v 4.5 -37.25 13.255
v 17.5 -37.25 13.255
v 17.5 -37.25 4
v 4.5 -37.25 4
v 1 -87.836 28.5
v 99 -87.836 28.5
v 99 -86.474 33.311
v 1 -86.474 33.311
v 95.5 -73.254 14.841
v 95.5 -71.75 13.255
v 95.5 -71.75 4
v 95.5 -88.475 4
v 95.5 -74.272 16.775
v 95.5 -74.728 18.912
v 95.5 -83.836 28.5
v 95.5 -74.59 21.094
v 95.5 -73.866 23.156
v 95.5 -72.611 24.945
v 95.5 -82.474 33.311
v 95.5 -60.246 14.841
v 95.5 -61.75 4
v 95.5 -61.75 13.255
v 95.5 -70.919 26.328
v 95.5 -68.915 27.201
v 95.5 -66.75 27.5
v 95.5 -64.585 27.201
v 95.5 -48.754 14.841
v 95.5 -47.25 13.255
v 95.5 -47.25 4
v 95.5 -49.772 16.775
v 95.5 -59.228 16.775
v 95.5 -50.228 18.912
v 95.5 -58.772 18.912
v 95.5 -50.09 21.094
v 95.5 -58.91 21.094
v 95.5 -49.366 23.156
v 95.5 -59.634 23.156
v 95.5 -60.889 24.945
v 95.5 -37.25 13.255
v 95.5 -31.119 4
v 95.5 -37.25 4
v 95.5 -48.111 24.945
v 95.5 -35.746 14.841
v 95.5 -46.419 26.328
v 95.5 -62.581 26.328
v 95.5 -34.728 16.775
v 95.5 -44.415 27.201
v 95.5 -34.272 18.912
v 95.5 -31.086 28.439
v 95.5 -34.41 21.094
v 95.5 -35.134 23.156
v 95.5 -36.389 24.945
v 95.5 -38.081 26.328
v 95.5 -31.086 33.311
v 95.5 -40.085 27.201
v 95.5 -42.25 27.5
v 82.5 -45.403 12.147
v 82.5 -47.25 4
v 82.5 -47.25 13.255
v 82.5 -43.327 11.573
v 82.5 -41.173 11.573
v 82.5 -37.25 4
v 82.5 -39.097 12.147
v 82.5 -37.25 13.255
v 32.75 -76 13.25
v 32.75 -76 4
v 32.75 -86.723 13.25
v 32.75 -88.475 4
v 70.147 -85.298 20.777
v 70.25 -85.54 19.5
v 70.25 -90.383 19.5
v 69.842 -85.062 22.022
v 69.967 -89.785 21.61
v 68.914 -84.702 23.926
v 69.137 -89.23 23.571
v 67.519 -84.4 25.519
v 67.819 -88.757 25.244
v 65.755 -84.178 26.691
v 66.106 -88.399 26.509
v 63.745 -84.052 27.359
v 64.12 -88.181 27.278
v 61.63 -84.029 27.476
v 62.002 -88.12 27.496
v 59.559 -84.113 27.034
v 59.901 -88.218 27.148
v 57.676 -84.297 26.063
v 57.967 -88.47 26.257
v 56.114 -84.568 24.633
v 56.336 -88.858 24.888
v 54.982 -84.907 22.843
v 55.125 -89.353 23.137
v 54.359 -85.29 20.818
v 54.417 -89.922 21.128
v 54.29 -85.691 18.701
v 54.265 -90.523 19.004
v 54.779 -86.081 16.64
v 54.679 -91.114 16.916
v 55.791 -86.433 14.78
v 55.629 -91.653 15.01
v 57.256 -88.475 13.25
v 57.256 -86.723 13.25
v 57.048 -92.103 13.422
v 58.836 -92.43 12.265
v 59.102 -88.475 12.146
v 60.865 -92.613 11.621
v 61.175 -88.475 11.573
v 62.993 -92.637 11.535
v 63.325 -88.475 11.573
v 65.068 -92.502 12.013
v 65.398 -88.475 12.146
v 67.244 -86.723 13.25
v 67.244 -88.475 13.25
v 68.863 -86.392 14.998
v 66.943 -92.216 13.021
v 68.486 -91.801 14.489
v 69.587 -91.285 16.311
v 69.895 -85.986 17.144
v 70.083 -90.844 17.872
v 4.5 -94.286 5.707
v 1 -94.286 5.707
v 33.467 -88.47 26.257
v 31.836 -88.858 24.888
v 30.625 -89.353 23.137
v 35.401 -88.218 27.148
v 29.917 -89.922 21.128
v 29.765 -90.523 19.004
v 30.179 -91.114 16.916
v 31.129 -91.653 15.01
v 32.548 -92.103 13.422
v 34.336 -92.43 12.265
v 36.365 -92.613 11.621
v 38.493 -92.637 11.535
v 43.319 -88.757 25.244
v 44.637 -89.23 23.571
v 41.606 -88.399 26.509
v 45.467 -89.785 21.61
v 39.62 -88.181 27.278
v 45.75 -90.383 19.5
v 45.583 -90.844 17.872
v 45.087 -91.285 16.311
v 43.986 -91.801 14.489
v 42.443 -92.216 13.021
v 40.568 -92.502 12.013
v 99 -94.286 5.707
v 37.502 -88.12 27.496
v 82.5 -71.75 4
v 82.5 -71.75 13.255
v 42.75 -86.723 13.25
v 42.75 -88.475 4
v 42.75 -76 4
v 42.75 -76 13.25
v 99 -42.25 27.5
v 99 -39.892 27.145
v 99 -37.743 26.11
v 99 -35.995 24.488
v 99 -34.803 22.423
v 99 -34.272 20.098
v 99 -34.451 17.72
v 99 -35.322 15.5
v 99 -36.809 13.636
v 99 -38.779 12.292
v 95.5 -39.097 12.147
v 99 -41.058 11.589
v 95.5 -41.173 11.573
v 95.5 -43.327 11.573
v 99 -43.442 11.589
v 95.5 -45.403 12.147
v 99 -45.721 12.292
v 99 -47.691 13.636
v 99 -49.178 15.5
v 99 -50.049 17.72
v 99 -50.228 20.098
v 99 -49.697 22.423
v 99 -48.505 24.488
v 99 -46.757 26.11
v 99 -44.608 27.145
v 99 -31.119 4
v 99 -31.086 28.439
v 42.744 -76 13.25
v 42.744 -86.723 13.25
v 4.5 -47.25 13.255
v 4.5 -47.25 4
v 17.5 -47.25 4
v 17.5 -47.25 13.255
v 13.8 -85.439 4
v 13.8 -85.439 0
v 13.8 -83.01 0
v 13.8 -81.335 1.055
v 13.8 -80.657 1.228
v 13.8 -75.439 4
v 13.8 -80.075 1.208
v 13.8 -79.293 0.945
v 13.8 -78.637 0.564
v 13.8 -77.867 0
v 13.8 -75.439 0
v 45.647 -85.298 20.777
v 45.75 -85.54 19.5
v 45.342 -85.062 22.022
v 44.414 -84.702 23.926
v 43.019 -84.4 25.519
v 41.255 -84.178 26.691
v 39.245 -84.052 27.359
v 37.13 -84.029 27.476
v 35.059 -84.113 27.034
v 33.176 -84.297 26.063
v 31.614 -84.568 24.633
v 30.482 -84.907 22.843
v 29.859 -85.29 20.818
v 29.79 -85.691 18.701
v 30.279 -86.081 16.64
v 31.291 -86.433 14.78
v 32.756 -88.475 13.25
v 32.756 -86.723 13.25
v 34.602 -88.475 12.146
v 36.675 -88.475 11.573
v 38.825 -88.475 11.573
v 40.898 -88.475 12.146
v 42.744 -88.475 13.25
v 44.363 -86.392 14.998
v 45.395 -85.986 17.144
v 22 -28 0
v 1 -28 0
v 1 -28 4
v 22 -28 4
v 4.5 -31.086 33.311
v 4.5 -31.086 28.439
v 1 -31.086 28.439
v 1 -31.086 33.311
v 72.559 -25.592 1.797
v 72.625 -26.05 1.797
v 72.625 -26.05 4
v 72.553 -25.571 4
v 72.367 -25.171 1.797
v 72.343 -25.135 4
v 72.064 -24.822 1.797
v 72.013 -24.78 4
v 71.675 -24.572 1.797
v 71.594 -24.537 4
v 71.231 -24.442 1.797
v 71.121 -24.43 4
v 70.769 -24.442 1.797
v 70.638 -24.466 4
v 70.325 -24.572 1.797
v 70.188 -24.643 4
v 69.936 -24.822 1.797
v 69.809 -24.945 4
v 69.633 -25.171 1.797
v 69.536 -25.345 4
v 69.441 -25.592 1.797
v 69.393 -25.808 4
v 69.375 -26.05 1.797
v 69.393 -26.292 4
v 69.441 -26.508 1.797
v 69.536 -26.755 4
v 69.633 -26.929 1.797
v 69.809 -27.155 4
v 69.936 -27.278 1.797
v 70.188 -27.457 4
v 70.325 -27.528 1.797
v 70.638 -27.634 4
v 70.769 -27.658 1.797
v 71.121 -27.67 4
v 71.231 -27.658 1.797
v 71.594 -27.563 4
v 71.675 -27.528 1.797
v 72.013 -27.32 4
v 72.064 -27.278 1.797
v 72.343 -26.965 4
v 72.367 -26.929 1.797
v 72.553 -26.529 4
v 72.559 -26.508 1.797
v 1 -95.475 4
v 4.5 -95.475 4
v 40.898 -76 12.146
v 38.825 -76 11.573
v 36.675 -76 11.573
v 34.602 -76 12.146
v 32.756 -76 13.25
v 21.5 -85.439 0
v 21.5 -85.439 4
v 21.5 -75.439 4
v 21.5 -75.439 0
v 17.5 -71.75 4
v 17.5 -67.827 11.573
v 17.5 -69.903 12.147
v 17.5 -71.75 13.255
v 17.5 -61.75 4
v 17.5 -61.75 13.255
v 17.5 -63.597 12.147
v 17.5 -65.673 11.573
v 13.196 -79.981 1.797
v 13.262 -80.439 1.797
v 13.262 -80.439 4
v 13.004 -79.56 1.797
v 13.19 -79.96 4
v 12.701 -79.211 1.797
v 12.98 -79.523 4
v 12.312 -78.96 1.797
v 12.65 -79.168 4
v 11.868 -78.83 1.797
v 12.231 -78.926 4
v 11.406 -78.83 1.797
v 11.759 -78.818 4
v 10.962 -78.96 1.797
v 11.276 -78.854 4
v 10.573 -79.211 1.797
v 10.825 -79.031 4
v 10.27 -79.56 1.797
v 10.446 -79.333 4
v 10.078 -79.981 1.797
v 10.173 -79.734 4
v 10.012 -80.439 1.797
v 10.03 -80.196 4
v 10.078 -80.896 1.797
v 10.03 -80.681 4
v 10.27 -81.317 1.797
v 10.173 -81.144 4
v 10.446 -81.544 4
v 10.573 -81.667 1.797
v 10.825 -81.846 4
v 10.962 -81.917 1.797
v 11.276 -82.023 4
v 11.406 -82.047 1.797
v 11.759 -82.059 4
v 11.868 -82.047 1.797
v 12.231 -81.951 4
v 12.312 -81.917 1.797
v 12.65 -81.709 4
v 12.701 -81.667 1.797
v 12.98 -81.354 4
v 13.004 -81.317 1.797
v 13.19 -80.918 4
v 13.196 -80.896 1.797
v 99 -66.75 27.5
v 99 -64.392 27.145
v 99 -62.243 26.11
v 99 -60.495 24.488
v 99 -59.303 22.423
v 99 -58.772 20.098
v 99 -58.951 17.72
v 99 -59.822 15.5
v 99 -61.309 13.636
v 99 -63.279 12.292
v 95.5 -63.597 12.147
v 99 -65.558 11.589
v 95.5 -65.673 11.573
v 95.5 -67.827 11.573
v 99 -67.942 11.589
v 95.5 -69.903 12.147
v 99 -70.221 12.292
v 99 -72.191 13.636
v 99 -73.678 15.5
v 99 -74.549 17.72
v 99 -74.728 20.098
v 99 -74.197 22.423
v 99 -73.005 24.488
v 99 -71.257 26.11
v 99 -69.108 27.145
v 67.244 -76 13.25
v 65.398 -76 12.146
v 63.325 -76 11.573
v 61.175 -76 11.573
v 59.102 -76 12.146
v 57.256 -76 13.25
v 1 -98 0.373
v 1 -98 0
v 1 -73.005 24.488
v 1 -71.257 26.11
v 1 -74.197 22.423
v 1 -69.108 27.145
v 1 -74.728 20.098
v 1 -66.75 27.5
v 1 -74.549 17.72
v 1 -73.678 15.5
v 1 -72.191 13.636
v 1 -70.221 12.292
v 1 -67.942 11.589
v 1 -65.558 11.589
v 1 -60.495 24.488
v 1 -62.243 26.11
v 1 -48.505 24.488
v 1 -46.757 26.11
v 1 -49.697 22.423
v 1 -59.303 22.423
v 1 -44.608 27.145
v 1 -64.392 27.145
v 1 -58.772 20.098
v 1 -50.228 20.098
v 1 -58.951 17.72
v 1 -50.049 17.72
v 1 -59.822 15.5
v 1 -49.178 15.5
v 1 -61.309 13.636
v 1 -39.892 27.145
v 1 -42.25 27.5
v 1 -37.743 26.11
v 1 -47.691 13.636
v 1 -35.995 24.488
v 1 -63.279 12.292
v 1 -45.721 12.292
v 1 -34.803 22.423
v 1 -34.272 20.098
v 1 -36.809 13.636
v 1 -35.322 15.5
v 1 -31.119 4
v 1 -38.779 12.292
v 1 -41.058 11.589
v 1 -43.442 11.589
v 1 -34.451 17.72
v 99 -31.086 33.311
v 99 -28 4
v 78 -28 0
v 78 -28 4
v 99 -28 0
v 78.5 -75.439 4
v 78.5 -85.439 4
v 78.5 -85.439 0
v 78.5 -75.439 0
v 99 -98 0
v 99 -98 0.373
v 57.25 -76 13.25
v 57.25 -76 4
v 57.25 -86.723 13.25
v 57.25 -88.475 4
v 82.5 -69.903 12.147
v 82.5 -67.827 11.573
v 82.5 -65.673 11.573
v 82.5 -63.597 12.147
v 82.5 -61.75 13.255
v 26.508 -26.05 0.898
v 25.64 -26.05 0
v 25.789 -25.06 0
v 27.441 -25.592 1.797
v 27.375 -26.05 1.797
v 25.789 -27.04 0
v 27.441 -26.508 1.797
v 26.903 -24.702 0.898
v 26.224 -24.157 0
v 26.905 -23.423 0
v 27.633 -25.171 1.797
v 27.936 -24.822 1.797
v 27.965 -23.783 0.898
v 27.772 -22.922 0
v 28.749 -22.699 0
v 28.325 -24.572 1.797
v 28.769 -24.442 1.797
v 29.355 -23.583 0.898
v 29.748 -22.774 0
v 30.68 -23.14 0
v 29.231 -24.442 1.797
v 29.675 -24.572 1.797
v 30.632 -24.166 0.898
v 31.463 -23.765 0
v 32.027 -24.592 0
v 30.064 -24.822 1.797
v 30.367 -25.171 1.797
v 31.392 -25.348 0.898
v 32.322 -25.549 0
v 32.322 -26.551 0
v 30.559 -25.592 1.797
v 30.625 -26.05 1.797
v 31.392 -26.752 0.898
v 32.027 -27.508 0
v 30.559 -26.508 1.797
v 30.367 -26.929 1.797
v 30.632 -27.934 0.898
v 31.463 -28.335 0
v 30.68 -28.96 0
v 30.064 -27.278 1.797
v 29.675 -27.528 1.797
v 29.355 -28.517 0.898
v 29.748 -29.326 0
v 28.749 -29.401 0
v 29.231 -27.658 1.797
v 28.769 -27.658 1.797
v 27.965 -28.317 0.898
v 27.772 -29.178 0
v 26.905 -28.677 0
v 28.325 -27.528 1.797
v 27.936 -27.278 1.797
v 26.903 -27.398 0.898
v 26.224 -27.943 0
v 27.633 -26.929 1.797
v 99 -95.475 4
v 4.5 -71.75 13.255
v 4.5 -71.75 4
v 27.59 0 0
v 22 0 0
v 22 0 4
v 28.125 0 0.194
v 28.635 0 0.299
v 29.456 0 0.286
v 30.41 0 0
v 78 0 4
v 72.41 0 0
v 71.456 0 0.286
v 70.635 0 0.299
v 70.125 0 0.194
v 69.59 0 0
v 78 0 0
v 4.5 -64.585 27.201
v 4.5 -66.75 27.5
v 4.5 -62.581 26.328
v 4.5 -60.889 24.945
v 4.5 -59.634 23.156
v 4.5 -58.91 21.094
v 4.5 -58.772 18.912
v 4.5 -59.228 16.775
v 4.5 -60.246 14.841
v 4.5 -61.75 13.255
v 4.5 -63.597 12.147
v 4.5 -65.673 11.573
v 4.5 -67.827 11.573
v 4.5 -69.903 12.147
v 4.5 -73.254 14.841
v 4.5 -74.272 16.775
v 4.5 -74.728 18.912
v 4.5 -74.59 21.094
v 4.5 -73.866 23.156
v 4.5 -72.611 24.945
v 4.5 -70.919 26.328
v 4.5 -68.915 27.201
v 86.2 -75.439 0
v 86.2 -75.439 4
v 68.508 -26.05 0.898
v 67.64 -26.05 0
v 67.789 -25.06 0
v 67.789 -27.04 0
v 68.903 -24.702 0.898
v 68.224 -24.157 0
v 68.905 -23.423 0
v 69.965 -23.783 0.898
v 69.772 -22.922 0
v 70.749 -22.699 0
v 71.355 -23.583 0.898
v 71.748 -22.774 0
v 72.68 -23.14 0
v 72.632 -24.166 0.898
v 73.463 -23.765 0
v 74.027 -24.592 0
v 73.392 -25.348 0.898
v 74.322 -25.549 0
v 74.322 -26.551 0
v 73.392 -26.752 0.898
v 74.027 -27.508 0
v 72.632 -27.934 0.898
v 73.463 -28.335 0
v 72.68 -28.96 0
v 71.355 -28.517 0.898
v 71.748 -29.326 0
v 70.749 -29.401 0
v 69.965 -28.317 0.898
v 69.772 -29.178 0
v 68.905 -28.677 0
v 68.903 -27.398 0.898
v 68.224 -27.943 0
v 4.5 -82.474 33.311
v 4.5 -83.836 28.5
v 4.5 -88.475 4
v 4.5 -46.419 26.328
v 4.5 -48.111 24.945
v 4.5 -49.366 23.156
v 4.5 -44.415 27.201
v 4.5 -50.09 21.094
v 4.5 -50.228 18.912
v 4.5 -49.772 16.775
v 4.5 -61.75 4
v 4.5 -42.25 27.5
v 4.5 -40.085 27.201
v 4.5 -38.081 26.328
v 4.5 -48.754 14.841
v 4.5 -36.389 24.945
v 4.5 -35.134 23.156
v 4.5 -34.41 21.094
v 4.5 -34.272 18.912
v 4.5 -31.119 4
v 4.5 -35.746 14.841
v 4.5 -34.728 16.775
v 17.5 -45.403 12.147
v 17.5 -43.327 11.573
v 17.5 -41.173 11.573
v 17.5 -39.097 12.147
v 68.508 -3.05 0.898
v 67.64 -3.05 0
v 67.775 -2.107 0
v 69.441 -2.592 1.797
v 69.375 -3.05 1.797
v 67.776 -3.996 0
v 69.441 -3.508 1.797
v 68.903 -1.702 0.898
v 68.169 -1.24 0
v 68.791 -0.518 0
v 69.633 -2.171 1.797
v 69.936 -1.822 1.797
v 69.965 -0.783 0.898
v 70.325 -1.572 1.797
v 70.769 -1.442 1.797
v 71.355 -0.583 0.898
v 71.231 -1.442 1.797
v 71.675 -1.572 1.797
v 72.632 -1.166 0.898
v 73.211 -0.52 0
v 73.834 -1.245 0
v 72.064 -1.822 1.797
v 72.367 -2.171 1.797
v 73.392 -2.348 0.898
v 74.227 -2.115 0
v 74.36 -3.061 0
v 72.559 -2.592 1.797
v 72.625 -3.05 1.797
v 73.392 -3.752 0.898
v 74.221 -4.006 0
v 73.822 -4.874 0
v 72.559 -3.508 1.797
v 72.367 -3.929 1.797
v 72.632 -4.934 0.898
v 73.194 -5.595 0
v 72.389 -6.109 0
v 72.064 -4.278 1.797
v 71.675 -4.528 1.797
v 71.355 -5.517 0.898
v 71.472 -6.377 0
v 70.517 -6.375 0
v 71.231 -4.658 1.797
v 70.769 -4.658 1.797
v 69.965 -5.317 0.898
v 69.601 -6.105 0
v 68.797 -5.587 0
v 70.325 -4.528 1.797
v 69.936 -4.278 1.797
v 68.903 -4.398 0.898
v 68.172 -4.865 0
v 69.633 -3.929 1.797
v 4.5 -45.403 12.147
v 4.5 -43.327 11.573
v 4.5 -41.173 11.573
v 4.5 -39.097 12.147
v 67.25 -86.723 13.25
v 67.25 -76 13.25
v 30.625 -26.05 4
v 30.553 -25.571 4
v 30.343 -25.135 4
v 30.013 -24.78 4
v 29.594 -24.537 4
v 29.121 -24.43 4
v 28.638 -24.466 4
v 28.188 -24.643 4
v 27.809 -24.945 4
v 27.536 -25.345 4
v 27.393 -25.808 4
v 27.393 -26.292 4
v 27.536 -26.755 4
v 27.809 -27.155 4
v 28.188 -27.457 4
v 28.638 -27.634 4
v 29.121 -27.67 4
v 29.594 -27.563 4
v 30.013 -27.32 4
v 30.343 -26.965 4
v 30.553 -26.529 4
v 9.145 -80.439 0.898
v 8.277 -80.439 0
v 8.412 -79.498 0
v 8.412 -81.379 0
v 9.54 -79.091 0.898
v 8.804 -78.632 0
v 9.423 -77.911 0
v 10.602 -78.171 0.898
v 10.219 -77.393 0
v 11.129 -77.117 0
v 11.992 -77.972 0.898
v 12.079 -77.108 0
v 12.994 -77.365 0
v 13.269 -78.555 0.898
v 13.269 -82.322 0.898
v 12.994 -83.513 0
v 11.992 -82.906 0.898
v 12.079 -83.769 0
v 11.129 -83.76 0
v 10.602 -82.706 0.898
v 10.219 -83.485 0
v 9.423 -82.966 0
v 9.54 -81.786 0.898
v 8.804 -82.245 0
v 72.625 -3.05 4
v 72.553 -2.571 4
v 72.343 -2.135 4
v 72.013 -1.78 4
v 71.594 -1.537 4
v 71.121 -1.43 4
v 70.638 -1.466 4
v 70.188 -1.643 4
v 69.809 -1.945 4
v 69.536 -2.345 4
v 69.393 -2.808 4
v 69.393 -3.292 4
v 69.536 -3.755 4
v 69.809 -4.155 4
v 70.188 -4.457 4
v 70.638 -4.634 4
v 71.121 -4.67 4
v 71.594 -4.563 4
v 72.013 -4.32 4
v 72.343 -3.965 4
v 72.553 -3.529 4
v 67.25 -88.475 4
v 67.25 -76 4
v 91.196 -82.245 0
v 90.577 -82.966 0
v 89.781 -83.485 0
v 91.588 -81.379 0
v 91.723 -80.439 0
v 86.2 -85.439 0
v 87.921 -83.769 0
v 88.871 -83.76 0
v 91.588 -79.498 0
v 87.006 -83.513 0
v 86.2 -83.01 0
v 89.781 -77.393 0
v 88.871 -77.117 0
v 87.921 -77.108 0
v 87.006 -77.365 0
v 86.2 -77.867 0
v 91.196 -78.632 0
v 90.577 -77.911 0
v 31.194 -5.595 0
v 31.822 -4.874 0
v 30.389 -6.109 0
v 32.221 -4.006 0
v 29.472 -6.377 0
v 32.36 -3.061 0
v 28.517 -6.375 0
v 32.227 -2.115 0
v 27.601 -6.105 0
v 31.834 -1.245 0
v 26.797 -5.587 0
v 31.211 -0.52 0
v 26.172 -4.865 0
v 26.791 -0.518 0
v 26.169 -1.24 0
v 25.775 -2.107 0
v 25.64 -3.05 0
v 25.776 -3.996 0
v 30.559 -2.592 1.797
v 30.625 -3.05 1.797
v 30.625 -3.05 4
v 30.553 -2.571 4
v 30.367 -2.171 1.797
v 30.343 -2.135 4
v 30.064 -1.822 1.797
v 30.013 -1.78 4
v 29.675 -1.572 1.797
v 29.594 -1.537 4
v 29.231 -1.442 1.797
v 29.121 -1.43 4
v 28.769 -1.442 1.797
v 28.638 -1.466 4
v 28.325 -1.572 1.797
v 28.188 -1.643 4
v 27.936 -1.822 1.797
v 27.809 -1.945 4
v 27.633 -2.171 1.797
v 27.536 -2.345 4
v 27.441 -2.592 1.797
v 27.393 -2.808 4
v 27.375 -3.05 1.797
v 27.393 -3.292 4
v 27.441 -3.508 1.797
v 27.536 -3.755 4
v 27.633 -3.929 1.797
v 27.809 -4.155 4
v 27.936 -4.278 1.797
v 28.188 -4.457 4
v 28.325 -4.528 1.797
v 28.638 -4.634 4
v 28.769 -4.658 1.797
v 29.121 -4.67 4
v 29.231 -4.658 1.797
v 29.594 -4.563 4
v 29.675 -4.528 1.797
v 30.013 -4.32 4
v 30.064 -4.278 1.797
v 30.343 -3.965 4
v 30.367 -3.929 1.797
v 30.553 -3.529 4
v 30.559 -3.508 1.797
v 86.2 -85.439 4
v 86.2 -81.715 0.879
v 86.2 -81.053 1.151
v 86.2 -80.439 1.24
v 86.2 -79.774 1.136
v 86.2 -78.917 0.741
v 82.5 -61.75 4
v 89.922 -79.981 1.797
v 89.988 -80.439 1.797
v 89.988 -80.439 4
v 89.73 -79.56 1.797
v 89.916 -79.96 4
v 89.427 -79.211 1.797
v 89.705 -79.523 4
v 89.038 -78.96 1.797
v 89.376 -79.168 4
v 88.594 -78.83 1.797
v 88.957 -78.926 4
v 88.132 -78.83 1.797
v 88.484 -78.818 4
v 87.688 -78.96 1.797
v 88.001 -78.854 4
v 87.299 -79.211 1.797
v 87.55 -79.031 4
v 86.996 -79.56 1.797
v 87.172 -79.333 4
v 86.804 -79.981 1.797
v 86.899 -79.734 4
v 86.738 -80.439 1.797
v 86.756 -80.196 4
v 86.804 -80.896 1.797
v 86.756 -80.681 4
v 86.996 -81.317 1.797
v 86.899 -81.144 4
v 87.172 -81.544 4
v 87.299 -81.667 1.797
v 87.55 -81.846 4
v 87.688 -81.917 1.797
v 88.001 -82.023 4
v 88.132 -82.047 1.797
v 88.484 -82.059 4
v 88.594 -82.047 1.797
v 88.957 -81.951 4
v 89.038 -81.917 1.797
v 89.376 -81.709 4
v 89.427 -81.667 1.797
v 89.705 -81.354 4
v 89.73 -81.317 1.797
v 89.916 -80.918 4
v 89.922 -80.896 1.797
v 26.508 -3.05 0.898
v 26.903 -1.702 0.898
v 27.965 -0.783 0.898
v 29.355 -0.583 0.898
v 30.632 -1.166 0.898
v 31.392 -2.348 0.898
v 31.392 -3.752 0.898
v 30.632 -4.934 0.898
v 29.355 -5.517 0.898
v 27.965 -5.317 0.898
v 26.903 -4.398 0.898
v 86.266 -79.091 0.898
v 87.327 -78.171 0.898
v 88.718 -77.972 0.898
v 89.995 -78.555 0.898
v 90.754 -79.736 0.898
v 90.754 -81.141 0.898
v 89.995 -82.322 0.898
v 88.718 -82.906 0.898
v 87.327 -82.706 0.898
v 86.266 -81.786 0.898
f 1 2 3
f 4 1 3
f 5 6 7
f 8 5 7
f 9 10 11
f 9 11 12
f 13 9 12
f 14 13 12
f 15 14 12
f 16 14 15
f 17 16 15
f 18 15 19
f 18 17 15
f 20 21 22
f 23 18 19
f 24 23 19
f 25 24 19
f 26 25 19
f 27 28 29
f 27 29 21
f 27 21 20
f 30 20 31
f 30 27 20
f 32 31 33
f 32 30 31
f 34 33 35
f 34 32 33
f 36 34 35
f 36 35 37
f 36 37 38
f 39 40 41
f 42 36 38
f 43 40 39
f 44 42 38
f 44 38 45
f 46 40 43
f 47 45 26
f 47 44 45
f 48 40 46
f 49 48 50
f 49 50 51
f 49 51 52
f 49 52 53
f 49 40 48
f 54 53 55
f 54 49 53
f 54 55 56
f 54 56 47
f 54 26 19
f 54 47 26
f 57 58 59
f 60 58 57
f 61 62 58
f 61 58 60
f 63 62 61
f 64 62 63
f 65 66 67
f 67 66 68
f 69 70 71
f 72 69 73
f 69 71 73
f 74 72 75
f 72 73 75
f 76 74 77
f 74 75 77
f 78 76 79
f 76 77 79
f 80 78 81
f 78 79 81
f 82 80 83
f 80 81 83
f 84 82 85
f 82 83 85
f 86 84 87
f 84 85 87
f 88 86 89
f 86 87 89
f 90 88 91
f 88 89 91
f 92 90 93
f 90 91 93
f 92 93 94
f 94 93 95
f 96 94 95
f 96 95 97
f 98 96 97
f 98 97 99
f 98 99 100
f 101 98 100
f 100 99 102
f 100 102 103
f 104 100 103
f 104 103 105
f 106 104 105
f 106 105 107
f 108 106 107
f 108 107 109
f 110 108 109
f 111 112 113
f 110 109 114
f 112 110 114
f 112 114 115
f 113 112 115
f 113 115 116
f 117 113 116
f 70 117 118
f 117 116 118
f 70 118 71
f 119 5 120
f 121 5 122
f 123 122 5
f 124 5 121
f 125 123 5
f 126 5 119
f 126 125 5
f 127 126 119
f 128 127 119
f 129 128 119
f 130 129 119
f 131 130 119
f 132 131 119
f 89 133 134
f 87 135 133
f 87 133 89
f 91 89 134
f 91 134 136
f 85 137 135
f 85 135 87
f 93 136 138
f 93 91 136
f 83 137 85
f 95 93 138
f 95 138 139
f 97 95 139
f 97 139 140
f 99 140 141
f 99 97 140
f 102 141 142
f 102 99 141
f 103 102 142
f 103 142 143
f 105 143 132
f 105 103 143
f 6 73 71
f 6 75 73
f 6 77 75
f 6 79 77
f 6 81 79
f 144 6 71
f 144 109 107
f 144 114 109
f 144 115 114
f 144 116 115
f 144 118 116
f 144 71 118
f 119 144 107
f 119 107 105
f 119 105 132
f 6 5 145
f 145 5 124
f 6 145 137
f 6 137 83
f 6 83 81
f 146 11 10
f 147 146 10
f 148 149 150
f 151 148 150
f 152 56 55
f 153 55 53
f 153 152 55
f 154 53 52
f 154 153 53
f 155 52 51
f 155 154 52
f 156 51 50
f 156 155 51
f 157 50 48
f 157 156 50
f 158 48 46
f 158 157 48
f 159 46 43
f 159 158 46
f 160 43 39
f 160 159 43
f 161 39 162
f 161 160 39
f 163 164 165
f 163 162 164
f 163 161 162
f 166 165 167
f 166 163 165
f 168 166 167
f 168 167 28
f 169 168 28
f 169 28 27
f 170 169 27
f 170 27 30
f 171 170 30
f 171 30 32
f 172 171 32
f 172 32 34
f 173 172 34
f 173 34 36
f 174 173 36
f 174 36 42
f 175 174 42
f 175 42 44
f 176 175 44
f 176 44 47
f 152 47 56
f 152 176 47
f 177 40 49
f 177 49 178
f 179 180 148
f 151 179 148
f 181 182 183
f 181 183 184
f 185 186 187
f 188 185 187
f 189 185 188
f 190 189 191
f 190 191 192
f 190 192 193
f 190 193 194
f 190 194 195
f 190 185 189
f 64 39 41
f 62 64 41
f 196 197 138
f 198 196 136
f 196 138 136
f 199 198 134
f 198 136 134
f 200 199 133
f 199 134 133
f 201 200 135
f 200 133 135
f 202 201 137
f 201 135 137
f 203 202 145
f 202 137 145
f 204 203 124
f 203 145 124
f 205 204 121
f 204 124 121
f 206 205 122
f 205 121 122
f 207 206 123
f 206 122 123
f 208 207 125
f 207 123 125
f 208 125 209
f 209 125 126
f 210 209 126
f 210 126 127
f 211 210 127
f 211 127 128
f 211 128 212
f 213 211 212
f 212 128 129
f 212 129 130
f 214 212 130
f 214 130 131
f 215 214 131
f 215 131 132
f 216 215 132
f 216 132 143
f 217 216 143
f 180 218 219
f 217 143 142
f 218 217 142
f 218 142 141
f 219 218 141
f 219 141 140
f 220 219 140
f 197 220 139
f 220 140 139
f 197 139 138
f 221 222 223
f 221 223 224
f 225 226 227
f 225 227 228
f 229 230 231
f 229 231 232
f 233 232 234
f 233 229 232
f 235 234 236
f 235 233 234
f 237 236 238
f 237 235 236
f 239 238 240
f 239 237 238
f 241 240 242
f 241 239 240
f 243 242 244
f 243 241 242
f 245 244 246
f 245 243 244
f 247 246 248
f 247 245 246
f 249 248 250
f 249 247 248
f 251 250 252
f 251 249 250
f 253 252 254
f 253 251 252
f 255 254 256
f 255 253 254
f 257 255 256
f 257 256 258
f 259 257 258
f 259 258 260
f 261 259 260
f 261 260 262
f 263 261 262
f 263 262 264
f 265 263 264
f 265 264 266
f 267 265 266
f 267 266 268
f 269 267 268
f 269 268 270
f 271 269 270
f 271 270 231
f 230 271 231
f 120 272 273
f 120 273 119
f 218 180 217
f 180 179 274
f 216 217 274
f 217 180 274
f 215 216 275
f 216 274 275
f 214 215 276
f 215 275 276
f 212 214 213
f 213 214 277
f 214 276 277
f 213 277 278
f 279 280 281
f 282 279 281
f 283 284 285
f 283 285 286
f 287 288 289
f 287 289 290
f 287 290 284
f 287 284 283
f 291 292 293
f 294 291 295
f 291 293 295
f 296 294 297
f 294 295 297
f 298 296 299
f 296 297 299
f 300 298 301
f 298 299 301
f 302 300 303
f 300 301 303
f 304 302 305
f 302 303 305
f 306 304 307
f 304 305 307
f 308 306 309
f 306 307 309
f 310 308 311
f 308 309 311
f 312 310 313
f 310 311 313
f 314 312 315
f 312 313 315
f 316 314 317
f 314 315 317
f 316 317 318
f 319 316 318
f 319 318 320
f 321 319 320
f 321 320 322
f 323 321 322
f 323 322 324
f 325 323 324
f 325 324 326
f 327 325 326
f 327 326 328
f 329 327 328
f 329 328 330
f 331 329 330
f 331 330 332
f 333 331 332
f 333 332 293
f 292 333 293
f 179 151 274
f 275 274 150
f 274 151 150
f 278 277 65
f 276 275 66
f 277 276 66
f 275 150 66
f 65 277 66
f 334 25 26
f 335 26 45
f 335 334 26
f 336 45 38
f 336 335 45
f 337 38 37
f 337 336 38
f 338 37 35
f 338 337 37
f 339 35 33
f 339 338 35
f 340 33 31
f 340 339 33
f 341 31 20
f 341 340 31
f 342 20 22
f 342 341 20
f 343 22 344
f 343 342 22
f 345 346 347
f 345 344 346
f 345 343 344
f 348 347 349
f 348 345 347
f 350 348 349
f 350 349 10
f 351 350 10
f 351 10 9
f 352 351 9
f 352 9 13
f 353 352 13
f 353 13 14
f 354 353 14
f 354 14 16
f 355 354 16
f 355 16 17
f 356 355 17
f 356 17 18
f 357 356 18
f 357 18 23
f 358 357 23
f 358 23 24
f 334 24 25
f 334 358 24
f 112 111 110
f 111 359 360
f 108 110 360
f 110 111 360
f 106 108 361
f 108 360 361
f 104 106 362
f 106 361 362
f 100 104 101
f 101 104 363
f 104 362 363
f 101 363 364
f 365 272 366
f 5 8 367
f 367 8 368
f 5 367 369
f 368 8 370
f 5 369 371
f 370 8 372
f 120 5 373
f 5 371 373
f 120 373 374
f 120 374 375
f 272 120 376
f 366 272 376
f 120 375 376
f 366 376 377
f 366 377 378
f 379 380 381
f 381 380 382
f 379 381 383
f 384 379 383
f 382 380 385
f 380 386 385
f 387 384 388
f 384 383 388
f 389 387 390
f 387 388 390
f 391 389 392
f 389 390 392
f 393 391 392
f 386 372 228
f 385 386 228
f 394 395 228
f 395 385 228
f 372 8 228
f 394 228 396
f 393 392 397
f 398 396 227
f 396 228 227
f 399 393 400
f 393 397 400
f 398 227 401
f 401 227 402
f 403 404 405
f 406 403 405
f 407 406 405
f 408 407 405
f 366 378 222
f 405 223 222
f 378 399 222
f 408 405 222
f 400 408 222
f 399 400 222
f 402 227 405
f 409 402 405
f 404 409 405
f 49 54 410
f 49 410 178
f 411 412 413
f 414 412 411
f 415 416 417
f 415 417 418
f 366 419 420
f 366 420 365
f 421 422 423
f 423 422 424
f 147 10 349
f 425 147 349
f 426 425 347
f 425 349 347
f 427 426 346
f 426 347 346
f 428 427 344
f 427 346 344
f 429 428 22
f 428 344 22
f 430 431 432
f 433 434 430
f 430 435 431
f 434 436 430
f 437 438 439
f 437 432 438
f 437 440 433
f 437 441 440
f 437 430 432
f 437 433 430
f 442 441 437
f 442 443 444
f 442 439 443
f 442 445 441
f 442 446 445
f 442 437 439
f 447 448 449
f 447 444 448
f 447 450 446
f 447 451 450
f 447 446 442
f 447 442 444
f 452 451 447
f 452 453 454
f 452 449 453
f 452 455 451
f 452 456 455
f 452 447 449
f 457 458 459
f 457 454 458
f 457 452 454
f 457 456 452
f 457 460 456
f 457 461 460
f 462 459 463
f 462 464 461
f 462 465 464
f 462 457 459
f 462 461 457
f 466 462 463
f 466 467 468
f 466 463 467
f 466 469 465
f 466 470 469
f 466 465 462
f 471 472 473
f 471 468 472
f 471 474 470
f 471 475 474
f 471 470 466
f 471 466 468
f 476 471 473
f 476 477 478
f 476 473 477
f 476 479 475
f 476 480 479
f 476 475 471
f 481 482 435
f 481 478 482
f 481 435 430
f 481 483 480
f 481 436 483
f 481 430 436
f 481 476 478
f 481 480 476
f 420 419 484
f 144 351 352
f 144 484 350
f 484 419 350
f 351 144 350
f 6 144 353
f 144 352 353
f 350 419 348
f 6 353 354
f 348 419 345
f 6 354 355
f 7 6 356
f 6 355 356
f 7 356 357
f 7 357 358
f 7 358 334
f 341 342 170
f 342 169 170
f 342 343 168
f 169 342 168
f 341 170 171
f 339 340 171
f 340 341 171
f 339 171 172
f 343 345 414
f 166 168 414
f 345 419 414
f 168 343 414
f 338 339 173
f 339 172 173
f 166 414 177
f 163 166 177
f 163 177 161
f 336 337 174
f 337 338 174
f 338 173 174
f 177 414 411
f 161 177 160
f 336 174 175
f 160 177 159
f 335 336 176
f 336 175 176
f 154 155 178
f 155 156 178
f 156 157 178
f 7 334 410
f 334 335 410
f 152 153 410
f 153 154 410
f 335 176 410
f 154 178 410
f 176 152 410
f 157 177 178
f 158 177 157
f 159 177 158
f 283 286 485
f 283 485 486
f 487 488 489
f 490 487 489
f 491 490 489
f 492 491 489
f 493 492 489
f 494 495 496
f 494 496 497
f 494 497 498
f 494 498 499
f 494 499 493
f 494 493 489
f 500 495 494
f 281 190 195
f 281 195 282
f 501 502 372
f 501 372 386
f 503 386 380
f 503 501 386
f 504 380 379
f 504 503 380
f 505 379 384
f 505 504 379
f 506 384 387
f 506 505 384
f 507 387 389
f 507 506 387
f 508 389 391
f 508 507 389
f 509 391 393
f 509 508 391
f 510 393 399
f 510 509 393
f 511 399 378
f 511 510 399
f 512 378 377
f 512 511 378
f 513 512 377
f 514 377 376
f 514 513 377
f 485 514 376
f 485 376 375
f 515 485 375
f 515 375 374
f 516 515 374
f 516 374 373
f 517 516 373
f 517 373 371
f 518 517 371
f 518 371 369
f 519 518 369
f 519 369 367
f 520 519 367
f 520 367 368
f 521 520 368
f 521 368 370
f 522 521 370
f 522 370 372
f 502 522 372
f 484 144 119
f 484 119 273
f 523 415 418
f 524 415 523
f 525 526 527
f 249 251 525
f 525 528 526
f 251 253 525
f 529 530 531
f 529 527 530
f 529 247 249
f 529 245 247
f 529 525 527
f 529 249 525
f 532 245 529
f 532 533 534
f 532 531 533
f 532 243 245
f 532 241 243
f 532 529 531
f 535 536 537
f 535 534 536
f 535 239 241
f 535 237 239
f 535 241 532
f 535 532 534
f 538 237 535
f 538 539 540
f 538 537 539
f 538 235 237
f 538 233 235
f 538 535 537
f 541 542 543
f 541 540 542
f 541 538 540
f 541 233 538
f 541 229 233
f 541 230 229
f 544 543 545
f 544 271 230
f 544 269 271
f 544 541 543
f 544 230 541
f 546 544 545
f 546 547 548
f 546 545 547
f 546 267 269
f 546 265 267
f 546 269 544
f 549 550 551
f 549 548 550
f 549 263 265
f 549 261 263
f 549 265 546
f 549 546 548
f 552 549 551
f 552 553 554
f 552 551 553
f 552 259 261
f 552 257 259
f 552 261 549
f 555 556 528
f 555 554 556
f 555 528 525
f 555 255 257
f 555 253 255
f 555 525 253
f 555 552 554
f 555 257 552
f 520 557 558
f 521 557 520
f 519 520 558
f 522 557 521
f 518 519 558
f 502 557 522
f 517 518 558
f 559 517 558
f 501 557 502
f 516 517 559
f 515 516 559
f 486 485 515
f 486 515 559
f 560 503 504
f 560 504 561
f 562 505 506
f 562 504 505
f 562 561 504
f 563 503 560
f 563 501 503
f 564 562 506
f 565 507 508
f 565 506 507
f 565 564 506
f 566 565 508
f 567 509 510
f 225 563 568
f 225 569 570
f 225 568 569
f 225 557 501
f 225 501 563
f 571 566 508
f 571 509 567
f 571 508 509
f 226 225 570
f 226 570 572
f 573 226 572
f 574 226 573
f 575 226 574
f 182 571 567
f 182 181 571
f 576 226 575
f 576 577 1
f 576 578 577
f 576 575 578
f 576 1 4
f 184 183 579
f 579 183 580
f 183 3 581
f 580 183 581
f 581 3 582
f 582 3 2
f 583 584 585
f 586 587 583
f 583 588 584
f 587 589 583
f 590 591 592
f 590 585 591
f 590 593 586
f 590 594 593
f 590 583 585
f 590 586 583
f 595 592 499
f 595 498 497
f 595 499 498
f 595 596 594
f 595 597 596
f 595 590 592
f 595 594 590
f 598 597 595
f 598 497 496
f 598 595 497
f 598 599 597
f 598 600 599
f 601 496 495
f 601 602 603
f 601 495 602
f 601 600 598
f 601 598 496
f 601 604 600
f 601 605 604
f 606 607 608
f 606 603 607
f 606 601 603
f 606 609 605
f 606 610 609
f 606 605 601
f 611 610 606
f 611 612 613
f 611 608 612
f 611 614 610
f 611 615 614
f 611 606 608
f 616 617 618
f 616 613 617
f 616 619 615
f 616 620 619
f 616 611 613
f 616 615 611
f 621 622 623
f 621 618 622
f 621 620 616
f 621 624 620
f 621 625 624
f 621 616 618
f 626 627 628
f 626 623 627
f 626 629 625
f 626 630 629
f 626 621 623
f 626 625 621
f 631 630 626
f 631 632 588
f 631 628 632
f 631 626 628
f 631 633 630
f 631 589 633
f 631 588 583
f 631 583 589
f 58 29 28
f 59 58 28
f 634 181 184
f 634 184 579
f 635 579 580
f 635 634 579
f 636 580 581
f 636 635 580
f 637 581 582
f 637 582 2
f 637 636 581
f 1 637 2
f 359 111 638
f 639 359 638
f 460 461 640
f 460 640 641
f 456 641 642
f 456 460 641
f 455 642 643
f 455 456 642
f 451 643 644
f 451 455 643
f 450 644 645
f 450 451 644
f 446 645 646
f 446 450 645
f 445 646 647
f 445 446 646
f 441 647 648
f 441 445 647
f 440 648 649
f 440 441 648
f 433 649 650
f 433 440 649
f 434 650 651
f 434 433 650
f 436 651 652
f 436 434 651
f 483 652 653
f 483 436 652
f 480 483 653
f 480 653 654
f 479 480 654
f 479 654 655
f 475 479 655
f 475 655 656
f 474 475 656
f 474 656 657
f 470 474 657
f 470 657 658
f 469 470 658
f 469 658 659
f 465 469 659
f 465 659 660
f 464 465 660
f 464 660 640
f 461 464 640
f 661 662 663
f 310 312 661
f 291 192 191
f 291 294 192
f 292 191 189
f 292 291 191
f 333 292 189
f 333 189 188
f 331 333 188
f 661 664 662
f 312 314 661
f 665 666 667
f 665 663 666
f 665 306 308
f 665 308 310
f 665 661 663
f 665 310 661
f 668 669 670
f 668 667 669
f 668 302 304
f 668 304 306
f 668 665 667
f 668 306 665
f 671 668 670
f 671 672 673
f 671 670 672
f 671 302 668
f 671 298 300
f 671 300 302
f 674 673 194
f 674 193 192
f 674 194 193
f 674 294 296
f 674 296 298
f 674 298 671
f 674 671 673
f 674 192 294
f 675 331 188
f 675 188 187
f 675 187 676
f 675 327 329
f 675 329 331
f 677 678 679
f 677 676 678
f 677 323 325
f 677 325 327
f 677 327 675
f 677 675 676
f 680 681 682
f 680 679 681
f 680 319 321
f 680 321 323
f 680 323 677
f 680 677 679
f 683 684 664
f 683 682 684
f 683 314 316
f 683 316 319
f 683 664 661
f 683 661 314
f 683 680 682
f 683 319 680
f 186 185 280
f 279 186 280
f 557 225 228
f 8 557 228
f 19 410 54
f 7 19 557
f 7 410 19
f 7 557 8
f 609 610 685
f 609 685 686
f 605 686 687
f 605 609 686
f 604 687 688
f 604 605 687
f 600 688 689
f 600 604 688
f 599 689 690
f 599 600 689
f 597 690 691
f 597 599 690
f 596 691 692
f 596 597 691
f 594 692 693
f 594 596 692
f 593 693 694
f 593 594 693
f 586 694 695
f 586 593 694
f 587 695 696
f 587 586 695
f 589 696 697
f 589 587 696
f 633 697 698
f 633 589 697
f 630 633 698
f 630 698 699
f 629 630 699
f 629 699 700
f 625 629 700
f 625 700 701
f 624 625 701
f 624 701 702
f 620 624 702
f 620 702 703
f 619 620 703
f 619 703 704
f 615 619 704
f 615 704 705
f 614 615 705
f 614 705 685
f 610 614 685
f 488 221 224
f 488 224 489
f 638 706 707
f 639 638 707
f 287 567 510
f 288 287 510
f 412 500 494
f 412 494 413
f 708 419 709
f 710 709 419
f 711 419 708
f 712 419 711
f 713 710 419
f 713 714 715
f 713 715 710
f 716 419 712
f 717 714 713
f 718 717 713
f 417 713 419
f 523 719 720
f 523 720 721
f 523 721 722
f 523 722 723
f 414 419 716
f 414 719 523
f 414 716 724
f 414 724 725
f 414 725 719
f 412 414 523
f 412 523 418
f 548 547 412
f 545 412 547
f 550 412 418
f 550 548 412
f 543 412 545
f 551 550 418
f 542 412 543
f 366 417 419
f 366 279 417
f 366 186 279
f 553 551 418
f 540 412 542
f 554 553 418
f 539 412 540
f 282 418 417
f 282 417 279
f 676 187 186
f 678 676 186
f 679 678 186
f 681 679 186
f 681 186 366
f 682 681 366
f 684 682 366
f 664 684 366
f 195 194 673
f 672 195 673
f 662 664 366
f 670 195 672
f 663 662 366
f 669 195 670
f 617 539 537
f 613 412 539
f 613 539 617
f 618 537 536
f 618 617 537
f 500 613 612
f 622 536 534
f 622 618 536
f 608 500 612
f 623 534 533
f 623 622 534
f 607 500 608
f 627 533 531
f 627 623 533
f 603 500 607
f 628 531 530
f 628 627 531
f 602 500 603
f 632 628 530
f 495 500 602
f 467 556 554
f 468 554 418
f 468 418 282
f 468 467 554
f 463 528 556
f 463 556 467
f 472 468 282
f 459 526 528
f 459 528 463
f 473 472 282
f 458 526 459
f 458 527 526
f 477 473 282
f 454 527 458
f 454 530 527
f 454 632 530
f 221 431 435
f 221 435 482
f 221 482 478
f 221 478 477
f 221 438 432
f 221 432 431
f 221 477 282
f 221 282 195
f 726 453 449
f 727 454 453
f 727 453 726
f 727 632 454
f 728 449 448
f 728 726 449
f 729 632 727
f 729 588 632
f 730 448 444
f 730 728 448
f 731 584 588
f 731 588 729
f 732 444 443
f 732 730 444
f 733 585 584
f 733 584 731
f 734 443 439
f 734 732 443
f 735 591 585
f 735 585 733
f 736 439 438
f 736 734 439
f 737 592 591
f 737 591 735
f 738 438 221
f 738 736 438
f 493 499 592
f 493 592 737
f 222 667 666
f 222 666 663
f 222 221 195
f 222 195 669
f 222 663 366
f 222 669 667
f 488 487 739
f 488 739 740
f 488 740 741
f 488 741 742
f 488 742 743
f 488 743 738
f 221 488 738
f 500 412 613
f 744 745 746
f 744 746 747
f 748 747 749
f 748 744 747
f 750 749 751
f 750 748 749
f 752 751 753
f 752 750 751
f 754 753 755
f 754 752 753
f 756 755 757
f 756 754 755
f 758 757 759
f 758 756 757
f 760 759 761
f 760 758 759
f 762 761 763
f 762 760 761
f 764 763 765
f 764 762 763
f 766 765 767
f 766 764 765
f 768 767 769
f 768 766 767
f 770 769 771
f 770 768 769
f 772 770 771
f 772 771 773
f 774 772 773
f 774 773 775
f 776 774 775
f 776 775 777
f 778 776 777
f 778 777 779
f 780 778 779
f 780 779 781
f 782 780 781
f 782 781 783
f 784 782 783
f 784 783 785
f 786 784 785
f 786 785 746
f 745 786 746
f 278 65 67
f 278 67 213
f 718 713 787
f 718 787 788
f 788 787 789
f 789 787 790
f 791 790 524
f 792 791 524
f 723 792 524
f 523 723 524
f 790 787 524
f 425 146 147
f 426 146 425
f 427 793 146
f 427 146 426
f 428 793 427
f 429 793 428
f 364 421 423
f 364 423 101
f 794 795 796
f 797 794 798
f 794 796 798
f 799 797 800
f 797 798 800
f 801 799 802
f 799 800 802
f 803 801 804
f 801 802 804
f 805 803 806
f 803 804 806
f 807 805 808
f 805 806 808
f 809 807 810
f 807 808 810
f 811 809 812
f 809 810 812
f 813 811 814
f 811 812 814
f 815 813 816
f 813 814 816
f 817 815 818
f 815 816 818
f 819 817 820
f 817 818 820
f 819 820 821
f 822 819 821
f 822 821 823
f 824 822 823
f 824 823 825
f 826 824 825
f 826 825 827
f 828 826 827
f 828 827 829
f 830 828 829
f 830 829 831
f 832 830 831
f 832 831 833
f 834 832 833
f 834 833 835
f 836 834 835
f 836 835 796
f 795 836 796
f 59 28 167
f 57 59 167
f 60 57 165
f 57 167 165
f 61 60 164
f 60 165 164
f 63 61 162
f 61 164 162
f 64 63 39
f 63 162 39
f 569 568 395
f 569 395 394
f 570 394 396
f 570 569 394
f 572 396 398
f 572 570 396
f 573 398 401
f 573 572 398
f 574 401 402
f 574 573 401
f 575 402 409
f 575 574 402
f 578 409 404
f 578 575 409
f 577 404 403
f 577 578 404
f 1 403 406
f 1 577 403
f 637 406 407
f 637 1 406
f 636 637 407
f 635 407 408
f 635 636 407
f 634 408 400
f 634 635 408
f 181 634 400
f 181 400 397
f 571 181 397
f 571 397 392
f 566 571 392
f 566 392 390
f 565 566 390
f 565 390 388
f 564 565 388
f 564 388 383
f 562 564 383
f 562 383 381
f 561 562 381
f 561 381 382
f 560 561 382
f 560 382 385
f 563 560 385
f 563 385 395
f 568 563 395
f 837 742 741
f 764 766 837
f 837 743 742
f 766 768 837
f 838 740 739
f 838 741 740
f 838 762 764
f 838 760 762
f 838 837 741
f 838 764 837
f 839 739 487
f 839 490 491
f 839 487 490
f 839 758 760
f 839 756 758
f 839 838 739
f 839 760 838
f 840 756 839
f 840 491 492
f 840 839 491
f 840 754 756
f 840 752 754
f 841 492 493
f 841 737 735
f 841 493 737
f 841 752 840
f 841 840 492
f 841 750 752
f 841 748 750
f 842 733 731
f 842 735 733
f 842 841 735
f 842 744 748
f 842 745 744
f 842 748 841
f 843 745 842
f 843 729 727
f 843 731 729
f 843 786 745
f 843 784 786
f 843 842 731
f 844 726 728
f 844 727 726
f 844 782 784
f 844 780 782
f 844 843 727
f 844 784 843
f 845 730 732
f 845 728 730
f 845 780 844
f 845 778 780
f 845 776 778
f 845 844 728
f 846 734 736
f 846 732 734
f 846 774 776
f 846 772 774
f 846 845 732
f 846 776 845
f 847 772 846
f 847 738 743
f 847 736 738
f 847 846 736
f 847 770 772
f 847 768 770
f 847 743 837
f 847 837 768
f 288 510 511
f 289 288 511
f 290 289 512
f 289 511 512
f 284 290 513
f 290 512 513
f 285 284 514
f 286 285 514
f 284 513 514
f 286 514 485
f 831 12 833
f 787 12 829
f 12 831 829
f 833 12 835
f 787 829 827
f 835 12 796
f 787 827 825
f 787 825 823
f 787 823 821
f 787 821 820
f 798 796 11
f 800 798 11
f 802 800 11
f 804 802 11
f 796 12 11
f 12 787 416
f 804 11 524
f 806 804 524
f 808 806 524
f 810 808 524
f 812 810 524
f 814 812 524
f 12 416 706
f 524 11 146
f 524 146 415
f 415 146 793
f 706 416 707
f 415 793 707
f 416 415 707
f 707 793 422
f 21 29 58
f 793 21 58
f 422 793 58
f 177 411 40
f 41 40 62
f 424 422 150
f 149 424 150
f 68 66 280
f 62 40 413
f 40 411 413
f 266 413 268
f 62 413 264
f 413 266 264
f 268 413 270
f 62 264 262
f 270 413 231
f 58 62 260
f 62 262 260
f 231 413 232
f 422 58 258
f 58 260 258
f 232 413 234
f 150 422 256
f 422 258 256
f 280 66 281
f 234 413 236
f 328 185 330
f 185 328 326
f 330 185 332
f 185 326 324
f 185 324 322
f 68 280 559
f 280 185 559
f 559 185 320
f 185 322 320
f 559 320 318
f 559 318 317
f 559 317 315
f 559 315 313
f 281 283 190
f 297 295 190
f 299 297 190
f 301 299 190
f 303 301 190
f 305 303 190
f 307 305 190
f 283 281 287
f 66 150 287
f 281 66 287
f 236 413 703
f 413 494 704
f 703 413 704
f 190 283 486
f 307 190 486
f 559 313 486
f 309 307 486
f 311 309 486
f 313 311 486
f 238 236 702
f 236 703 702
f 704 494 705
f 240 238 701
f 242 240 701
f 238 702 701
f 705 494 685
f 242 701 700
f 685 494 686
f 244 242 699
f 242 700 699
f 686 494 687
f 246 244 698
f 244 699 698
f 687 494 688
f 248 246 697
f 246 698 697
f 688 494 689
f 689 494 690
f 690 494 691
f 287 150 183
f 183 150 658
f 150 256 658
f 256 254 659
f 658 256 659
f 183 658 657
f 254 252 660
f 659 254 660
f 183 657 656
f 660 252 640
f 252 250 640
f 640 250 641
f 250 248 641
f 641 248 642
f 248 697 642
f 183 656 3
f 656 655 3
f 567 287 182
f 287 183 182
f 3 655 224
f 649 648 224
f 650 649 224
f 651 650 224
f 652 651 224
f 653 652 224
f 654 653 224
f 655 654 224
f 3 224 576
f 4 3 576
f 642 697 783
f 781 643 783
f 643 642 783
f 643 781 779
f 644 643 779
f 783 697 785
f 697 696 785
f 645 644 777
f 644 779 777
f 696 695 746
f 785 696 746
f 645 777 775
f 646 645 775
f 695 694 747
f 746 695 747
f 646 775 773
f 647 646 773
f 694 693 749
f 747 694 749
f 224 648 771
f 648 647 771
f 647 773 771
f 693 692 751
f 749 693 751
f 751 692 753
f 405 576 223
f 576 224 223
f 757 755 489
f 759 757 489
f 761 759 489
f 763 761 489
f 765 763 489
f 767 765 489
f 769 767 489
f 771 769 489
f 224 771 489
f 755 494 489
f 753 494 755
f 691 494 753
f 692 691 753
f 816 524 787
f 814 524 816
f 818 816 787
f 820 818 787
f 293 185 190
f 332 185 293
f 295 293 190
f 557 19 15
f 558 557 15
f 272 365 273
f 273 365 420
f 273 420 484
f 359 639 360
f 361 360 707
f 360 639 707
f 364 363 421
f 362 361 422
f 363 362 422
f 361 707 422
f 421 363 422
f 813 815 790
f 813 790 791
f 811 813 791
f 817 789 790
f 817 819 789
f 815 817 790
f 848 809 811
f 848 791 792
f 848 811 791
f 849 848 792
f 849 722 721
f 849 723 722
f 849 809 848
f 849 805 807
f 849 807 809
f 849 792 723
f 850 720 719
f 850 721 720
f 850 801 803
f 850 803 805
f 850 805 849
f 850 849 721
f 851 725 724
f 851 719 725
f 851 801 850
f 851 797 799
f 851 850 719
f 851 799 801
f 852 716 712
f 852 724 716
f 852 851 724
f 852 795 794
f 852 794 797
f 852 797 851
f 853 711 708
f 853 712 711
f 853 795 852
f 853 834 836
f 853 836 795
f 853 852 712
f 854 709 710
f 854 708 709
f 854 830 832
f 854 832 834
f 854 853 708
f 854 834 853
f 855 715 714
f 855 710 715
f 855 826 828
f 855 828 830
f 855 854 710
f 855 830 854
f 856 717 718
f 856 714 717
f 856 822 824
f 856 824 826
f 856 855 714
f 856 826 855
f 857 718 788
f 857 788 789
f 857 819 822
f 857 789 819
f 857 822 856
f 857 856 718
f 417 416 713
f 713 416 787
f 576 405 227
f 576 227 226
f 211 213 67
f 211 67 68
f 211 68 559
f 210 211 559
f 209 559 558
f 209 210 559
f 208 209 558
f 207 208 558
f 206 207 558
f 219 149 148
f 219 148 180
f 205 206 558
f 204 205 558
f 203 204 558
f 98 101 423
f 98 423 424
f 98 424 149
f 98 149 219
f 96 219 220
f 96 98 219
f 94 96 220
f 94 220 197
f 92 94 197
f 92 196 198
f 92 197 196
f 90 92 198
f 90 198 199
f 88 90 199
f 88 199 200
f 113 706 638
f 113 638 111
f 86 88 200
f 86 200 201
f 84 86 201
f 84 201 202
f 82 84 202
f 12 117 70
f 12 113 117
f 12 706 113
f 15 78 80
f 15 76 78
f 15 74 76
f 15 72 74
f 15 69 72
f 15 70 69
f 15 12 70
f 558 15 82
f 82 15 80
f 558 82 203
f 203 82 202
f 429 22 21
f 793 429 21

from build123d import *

# Parameters (mm, degrees)
CROQUIS1_R               = 1.625
SALIENTE_EXTRUIR1_DEPTH  = 4
SALIENTE_EXTRUIR2_DEPTH  = 3.5
CORTAR_EXTRUIR1_START    = -98
CORTAR_EXTRUIR1_DEPTH    = 98
SALIENTE_EXTRUIR4_DEPTH  = 3.5
CROQUIS11_W              = 3.5
CROQUIS11_H              = 24.500023525
SALIENTE_EXTRUIR16_DEPTH = 43.75
CORTAR_EXTRUIR2_START    = -98
CROQUIS13_R              = 8
CORTAR_EXTRUIR2_DEPTH    = 98
SALIENTE_EXTRUIR17_DEPTH = 91
CROQUIS15_R              = 8
CORTAR_EXTRUIR3_DEPTH    = 70
SALIENTE_EXTRUIR18_DEPTH = 98
SALIENTE_EXTRUIR19_START = -3.5
SALIENTE_EXTRUIR19_DEPTH = 3.5
SALIENTE_EXTRUIR20_START = -3.5
SALIENTE_EXTRUIR20_DEPTH = 3.5
CROQUIS22_R              = 1.625
CROQUIS22_W              = 7.7
CROQUIS22_H              = 10
CORTAR_EXTRUIR4_DEPTH    = 4
SALIENTE_EXTRUIR21_DEPTH = 13
SALIENTE_EXTRUIR22_DEPTH = 13
SALIENTE_EXTRUIR23_DEPTH = 9.25
CORTAR_EXTRUIR5_START    = -12.474615
CORTAR_EXTRUIR5_DEPTH    = 12.474615
CROQUIS27_R              = 3.36
CORTAR_EXTRUIR6_DEPTH    = 1.8
CORTAR_EXTRUIR6_TAPER    = 44


with BuildPart() as part:
    # Croquis1 → Saliente-Extruir1 (new body)
    with BuildSketch(Plane.XY):
        Polygon((99, -28), (99, -98), (1, -98), (1, -28), (22, -28), (22, 0), (78, 0), (78, -28), align=None)
        with Locations((29, -3.05)):
            Circle(CROQUIS1_R, mode=Mode.SUBTRACT)
        with Locations((29, -26.05)):
            Circle(CROQUIS1_R, mode=Mode.SUBTRACT)
        with Locations((71, -26.05)):
            Circle(CROQUIS1_R, mode=Mode.SUBTRACT)
        with Locations((71, -3.05)):
            Circle(CROQUIS1_R, mode=Mode.SUBTRACT)
    extrude(amount=SALIENTE_EXTRUIR1_DEPTH)

    # Croquis3 → Saliente-Extruir2 (add)
    with BuildSketch(Plane.ZY.offset(-1)):
        Polygon((4, -74.869484932), (3.981861285, -95.48724368), (5.706893625, -94.286253678), (28.5, -87.835533437), (28.5, -74.835533437), align=None)
    extrude(amount=-SALIENTE_EXTRUIR2_DEPTH)

    # Croquis4 → Cortar-Extruir1 (cut)
    with BuildSketch(Plane.ZY.offset(-1).offset(CORTAR_EXTRUIR1_START)):
        Polygon((4, -98), (0.372683932, -98), (4, -95.47461527), align=None)
    extrude(amount=CORTAR_EXTRUIR1_DEPTH, mode=Mode.SUBTRACT)

    # Croquis6 → Saliente-Extruir4 (add)
    with BuildSketch(Plane(origin=(99, 0, 0), x_dir=(0, 0, -1), z_dir=(1, 0, 0))):
        Polygon((-4, -95.47461527), (-5.706893625, -94.286253678), (-28.5, -87.835533437), (-28.5, -74.835533437), (-4, -74.869484932), align=None)
    extrude(amount=-SALIENTE_EXTRUIR4_DEPTH)

    # Croquis11 → Saliente-Extruir16 (add)
    with BuildSketch(Plane(origin=(0, -74.874884245, 0.103759765), x_dir=(1, 0, 0), z_dir=(0, 0.99999904, -0.001385774))):
        with Locations((97.25, -16.146255738)):
            Rectangle(CROQUIS11_W, CROQUIS11_H)
        with Locations((2.75, -16.146255738)):
            Rectangle(CROQUIS11_W, CROQUIS11_H)
    extrude(amount=SALIENTE_EXTRUIR16_DEPTH)

    # Croquis13 → Cortar-Extruir2 (cut)
    with BuildSketch(Plane.ZY.offset(-1).offset(CORTAR_EXTRUIR2_START)):
        with Locations((19.5, -42.25)):
            Circle(CROQUIS13_R)
        with Locations((19.5, -66.75)):
            Circle(CROQUIS13_R)
    extrude(amount=CORTAR_EXTRUIR2_DEPTH, mode=Mode.SUBTRACT)

    # Croquis14 → Saliente-Extruir17 (add)
    with BuildSketch(Plane.ZY.offset(-95.5)):
        Polygon((28.5, -87.835533437), (5.706893625, -94.286253678), (4, -95.47461527), (4, -88.47461527), (28.5, -83.835533437), align=None)
    extrude(amount=SALIENTE_EXTRUIR17_DEPTH)

    # Croquis15 → Cortar-Extruir3 (cut)
    with BuildSketch(Plane.XZ.offset(98)):
        with Locations((37.75, 19.5)):
            Circle(CROQUIS15_R)
        with Locations((62.25, 19.5)):
            Circle(CROQUIS15_R)
    extrude(amount=-CORTAR_EXTRUIR3_DEPTH, mode=Mode.SUBTRACT)

    # Croquis18 → Saliente-Extruir18 (add)
    with BuildSketch(Plane(origin=(99, 0, 0), x_dir=(0, 0, -1), z_dir=(1, 0, 0))):
        Polygon((-28.5, -87.835533437), (-33.311039019, -86.473952165), (-33.311039019, -82.473952165), (-28.5, -83.835533437), align=None)
    extrude(amount=-SALIENTE_EXTRUIR18_DEPTH)

    # Croquis19 → Saliente-Extruir19 (add)
    with BuildSketch(Plane(origin=(99, 0, 0), x_dir=(0, 0, -1), z_dir=(1, 0, 0)).offset(SALIENTE_EXTRUIR19_START)):
        Polygon((-28.5, -83.835533437), (-33.311039019, -82.473952165), (-33.311039019, -31.085575445), (-28.439372389, -31.085575445), (-28.5, -74.835533437), align=None)
    extrude(amount=SALIENTE_EXTRUIR19_DEPTH)

    # Croquis20 → Saliente-Extruir20 (add)
    with BuildSketch(Plane.ZY.offset(-1).offset(SALIENTE_EXTRUIR20_START)):
        Polygon((28.439372389, -31.085575445), (33.311039019, -31.085575445), (33.311039019, -82.473952165), (28.5, -83.835533437), (28.5, -74.835533437), align=None)
    extrude(amount=SALIENTE_EXTRUIR20_DEPTH)

    # Croquis22 → Cortar-Extruir4 (cut)
    with BuildSketch(Plane.XY.offset(4)):
        with Locations((88.362832, -80.438630677)):
            Circle(CROQUIS22_R)
        with Locations((11.637168, -80.438630677)):
            Circle(CROQUIS22_R)
        with Locations((82.35, -80.438630677)):
            Rectangle(CROQUIS22_W, CROQUIS22_H)
        with Locations((17.65, -80.438630677)):
            Rectangle(CROQUIS22_W, CROQUIS22_H)
    extrude(amount=-CORTAR_EXTRUIR4_DEPTH, mode=Mode.SUBTRACT)

    # Croquis23 → Saliente-Extruir21 (add)
    with BuildSketch(Plane(origin=(4.5, 0, 0), x_dir=(0, 0, -1), z_dir=(1, 0, 0))):
        with BuildLine():
            Line((-13.255002002, -71.75), (-4, -71.75))
            Line((-4, -71.75), (-4, -61.75))
            Line((-4, -61.75), (-13.255002002, -61.75))
            ThreePointArc((-13.255002002, -61.75), (-11.5, -66.75), (-13.255002002, -71.75))
        make_face()
        with BuildLine():
            Line((-4, -47.25), (-13.255002002, -47.25))
            ThreePointArc((-13.255002002, -47.25), (-11.5, -42.25), (-13.255002002, -37.25))
            Line((-13.255002002, -37.25), (-4, -37.25))
            Line((-4, -37.25), (-4, -47.25))
        make_face()
    extrude(amount=SALIENTE_EXTRUIR21_DEPTH)

    # Croquis24 → Saliente-Extruir22 (add)
    with BuildSketch(Plane.ZY.offset(-95.5)):
        with BuildLine():
            Line((13.255002002, -37.25), (4, -37.25))
            Line((4, -37.25), (4, -47.25))
            Line((4, -47.25), (13.255002002, -47.25))
            ThreePointArc((13.255002002, -47.25), (11.5, -42.25), (13.255002002, -37.25))
        make_face()
        with BuildLine():
            Line((13.255002002, -61.75), (4, -61.75))
            Line((4, -61.75), (4, -71.75))
            Line((4, -71.75), (13.255002002, -71.75))
            ThreePointArc((13.255002002, -71.75), (11.5, -66.75), (13.255002002, -61.75))
        make_face()
    extrude(amount=SALIENTE_EXTRUIR22_DEPTH)

    # Croquis25 → Saliente-Extruir23 (add)
    with BuildSketch(Plane.XY.offset(4)):
        Polygon((37.75, -88.47461527), (42.75, -88.47461527), (42.75, -76), (32.75, -76), (32.75, -88.47461527), align=None)
        Polygon((62.25, -88.47461527), (67.25, -88.47461527), (67.25, -76), (57.25, -76), (57.25, -88.47461527), align=None)
    extrude(amount=SALIENTE_EXTRUIR23_DEPTH)

    # Croquis26 → Cortar-Extruir5 (cut)
    with BuildSketch(Plane.XZ.offset(88.47461527).offset(CORTAR_EXTRUIR5_START)):
        with BuildLine():
            Line((57.256253911, 13.25), (67.243746089, 13.25))
            ThreePointArc((67.243746089, 13.25), (62.25, 11.5), (57.256253911, 13.25))
        make_face()
        with BuildLine():
            Line((32.756253911, 13.25), (42.743746089, 13.25))
            ThreePointArc((42.743746089, 13.25), (37.75, 11.5), (32.756253911, 13.25))
        make_face()
    extrude(amount=CORTAR_EXTRUIR5_DEPTH, mode=Mode.SUBTRACT)

    # Croquis27 → Cortar-Extruir6 (cut)
    with BuildSketch(Plane(origin=(0, 0, 0), x_dir=(-1, 0, 0), z_dir=(0, 0, -1))):
        with Locations((-29, -26.05)):
            Circle(CROQUIS27_R)
        with Locations((-71, -26.05)):
            Circle(CROQUIS27_R)
        with Locations((-71, -3.05)):
            Circle(CROQUIS27_R)
        with Locations((-29, -3.05)):
            Circle(CROQUIS27_R)
        with Locations((-11.637168, -80.438630677)):
            Circle(CROQUIS27_R)
        with Locations((-88.362832, -80.438630677)):
            Circle(CROQUIS27_R)
    extrude(amount=-CORTAR_EXTRUIR6_DEPTH, taper=CORTAR_EXTRUIR6_TAPER, mode=Mode.SUBTRACT)


solid = part.part
